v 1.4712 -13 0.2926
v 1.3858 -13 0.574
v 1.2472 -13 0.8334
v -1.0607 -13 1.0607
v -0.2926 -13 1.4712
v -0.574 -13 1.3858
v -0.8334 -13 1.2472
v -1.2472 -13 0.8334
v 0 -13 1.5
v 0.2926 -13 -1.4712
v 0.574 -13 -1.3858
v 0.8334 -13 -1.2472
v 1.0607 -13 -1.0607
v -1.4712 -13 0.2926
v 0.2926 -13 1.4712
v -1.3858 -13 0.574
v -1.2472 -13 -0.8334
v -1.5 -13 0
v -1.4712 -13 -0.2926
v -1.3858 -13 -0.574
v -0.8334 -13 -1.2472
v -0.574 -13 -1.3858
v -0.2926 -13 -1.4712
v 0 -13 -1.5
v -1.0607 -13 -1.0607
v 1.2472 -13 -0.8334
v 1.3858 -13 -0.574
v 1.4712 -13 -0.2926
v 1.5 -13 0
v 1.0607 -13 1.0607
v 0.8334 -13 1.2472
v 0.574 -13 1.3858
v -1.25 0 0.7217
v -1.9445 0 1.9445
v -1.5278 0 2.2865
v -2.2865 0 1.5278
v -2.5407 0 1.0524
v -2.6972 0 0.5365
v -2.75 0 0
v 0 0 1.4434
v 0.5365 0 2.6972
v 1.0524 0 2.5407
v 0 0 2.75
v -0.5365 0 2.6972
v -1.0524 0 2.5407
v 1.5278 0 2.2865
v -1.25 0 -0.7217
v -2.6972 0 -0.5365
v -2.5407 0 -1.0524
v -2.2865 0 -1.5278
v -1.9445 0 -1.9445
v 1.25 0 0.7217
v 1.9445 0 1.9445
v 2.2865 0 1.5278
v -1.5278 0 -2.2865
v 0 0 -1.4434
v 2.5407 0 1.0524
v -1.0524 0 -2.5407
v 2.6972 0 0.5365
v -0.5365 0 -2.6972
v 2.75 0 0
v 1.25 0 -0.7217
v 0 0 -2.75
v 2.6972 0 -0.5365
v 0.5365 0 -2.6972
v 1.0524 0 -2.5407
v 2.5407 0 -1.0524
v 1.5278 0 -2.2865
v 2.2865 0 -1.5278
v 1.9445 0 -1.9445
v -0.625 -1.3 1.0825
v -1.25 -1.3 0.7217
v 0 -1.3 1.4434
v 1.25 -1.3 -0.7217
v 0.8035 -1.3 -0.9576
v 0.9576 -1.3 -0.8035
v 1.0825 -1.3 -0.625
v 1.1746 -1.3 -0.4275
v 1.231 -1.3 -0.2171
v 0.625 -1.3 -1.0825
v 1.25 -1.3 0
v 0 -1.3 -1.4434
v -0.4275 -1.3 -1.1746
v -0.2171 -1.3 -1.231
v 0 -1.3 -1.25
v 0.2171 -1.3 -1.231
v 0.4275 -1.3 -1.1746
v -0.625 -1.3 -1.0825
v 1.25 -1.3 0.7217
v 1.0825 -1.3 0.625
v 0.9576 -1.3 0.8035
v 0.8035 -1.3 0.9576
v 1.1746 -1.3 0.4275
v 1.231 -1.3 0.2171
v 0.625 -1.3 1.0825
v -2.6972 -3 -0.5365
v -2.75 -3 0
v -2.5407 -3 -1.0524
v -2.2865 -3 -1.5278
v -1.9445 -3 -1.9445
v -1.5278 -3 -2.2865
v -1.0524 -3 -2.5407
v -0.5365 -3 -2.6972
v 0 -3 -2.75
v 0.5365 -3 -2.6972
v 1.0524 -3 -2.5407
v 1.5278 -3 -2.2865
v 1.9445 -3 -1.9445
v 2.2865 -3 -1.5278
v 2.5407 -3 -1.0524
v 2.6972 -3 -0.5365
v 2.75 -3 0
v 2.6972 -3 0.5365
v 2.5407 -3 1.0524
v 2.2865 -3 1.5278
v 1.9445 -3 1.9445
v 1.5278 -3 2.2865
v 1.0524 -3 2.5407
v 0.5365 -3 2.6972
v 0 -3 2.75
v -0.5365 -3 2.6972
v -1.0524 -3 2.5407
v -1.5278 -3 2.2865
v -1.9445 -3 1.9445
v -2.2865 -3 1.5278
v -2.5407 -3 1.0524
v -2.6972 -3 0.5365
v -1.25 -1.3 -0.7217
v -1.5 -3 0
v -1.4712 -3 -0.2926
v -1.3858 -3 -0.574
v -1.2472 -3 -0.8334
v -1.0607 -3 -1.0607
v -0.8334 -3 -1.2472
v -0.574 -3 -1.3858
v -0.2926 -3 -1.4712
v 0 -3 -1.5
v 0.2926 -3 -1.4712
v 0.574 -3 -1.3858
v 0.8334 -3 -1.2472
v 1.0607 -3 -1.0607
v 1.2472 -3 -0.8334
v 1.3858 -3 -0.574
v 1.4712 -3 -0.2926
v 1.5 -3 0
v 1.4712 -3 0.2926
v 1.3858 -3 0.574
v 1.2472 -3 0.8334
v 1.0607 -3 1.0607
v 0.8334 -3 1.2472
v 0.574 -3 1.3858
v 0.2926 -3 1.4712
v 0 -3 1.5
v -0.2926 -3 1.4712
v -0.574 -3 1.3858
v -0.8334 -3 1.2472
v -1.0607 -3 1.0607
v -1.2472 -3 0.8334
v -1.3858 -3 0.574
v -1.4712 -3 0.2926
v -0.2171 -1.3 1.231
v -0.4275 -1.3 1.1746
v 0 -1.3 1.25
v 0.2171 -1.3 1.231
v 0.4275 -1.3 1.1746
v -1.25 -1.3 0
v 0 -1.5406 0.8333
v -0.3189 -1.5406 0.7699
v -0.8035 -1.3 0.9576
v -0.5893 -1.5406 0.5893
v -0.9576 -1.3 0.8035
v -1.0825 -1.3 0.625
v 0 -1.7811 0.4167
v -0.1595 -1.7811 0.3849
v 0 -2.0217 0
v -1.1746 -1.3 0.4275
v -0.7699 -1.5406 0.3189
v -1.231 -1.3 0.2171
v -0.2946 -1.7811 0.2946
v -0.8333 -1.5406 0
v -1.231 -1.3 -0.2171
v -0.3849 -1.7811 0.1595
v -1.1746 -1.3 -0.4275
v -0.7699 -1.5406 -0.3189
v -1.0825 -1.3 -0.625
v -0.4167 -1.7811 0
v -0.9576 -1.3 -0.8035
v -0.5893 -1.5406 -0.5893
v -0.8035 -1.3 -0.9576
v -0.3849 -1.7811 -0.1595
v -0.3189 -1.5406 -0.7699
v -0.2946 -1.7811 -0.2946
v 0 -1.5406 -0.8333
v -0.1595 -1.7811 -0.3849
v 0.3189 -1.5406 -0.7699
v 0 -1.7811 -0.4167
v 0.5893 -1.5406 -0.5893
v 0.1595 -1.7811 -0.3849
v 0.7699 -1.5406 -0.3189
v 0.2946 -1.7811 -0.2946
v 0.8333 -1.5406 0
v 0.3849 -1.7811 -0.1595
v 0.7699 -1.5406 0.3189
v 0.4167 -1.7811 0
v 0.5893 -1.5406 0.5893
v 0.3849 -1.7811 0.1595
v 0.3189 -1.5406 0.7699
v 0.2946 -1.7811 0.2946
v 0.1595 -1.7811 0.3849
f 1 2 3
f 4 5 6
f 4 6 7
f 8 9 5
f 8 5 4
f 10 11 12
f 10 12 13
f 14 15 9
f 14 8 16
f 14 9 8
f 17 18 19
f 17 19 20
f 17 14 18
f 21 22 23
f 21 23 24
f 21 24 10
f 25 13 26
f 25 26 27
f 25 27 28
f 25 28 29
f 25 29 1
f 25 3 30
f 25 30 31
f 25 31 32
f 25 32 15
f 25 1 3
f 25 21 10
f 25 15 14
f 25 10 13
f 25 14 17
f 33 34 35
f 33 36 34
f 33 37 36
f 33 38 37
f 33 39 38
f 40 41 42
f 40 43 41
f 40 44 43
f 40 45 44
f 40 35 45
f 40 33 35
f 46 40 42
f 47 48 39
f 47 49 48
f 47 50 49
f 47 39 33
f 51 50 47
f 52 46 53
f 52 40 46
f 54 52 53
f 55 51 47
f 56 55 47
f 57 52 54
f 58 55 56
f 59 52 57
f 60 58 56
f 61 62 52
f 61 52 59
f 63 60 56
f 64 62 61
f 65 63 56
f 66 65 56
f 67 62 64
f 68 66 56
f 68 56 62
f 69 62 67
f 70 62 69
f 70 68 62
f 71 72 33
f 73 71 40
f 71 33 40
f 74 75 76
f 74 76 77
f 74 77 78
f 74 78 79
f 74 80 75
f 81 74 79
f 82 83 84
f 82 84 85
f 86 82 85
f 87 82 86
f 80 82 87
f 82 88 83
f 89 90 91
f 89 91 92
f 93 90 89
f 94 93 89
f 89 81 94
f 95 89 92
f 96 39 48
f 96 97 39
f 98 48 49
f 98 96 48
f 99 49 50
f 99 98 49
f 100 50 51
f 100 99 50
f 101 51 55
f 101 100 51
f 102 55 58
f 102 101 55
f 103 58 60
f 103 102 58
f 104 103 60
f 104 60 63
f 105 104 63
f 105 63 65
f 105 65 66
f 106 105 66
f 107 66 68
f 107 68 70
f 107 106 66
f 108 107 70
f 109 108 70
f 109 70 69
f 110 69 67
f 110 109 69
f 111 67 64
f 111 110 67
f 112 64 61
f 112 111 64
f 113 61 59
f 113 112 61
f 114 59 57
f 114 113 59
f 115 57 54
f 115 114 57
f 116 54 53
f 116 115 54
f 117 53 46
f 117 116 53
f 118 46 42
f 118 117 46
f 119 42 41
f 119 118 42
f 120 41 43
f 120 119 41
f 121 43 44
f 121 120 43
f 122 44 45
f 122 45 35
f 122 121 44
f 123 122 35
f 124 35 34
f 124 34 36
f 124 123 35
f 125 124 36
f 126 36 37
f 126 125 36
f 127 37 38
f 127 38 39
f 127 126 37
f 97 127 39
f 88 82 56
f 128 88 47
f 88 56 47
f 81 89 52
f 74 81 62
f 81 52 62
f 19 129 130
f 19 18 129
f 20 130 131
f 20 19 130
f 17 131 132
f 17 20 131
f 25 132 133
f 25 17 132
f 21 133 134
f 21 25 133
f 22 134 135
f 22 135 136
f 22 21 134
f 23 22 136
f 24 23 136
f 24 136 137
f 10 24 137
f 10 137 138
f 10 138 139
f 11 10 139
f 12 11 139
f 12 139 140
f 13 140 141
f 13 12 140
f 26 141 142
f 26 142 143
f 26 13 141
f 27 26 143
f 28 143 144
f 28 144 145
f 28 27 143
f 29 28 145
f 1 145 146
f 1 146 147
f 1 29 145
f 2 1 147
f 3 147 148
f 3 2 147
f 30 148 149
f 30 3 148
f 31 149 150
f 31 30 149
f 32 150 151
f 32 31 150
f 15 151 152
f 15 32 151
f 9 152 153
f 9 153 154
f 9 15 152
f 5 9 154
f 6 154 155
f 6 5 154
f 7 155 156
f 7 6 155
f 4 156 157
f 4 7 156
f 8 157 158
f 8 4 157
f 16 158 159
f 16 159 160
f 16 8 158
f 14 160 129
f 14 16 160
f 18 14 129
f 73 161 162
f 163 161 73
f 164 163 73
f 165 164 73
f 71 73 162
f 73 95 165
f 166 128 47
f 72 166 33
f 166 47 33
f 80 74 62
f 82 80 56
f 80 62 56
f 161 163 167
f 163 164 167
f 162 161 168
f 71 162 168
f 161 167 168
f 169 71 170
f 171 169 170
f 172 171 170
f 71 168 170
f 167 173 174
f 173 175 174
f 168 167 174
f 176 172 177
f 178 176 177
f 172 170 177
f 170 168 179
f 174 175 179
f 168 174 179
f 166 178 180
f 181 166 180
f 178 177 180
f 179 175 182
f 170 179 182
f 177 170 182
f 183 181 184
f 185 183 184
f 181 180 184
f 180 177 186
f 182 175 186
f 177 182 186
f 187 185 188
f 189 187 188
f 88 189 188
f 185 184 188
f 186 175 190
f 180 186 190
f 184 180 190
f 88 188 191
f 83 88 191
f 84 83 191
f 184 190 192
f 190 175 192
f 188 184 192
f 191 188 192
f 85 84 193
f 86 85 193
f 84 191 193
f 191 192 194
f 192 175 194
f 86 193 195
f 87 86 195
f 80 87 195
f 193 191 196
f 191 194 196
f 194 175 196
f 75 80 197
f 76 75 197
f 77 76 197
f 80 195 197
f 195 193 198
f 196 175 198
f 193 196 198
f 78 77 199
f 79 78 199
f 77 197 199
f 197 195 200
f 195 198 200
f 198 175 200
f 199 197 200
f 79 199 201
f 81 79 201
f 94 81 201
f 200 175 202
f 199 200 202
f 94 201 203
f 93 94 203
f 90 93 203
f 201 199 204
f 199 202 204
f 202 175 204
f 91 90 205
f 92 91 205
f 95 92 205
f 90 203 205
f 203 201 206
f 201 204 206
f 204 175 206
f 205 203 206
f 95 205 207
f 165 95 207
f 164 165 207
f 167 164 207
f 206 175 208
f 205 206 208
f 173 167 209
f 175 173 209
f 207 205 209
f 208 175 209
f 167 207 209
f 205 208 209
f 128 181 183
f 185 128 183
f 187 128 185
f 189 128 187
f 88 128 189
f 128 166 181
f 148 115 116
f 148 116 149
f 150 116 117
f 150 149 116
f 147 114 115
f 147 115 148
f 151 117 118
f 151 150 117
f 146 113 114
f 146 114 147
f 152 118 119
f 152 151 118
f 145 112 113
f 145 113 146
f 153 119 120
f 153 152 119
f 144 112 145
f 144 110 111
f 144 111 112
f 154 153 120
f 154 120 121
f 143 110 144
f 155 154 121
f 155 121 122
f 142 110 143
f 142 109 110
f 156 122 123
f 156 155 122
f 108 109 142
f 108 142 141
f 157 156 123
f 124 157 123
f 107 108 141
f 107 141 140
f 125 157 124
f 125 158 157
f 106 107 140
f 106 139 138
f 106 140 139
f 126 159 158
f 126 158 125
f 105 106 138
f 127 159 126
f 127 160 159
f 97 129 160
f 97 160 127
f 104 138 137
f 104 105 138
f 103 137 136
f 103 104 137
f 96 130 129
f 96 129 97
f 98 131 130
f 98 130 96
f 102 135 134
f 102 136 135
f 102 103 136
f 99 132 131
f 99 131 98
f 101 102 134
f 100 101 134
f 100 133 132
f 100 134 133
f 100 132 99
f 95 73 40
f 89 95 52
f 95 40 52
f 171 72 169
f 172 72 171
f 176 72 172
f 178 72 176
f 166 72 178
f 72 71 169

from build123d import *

# Parameters (mm, degrees)
CUT_EXTRUDE1_DEPTH = 1.3


with BuildPart() as part:
    # Sketch1 → Revolve1 (revolve)
    with BuildSketch(Plane.XY, mode=Mode.PRIVATE) as revolve1_sk:
        Polygon((0, 0), (2.75, 0), (2.75, -3), (1.5, -3), (1.5, -13), (0, -13), align=None)
    revolve(revolve1_sk.sketch.rotate(Axis((0, 0, 0), (0, -1, 0)), 180), axis=Axis((0, 0, 0), (0, -1, 0)))

    # Sketch2 → Cut-Revolve1 (revolve, cut)
    with BuildSketch(Plane.XY, mode=Mode.PRIVATE) as cut_revolve1_sk:
        Polygon((1.25, 0), (1.25, -1.3), (0, -2.021687836), (0, 0), align=None)
    revolve(cut_revolve1_sk.sketch.rotate(Axis((0, 0, 0), (0, -1, 0)), 90), axis=Axis((0, 0, 0), (0, -1, 0)), mode=Mode.SUBTRACT)

    # Sketch3 → Cut-Extrude1 (cut)
    with BuildSketch(Plane(origin=(0, 0, 0), x_dir=(1, 0, 0), z_dir=(0, 1, 0))):
        Polygon((0, 1.443375673), (-1.25, 0.721687836), (-1.25, -0.721687836), (0, -1.443375673), (1.25, -0.721687836), (1.25, 0.721687836), align=None)
    extrude(amount=-CUT_EXTRUDE1_DEPTH, mode=Mode.SUBTRACT)


solid = part.part
